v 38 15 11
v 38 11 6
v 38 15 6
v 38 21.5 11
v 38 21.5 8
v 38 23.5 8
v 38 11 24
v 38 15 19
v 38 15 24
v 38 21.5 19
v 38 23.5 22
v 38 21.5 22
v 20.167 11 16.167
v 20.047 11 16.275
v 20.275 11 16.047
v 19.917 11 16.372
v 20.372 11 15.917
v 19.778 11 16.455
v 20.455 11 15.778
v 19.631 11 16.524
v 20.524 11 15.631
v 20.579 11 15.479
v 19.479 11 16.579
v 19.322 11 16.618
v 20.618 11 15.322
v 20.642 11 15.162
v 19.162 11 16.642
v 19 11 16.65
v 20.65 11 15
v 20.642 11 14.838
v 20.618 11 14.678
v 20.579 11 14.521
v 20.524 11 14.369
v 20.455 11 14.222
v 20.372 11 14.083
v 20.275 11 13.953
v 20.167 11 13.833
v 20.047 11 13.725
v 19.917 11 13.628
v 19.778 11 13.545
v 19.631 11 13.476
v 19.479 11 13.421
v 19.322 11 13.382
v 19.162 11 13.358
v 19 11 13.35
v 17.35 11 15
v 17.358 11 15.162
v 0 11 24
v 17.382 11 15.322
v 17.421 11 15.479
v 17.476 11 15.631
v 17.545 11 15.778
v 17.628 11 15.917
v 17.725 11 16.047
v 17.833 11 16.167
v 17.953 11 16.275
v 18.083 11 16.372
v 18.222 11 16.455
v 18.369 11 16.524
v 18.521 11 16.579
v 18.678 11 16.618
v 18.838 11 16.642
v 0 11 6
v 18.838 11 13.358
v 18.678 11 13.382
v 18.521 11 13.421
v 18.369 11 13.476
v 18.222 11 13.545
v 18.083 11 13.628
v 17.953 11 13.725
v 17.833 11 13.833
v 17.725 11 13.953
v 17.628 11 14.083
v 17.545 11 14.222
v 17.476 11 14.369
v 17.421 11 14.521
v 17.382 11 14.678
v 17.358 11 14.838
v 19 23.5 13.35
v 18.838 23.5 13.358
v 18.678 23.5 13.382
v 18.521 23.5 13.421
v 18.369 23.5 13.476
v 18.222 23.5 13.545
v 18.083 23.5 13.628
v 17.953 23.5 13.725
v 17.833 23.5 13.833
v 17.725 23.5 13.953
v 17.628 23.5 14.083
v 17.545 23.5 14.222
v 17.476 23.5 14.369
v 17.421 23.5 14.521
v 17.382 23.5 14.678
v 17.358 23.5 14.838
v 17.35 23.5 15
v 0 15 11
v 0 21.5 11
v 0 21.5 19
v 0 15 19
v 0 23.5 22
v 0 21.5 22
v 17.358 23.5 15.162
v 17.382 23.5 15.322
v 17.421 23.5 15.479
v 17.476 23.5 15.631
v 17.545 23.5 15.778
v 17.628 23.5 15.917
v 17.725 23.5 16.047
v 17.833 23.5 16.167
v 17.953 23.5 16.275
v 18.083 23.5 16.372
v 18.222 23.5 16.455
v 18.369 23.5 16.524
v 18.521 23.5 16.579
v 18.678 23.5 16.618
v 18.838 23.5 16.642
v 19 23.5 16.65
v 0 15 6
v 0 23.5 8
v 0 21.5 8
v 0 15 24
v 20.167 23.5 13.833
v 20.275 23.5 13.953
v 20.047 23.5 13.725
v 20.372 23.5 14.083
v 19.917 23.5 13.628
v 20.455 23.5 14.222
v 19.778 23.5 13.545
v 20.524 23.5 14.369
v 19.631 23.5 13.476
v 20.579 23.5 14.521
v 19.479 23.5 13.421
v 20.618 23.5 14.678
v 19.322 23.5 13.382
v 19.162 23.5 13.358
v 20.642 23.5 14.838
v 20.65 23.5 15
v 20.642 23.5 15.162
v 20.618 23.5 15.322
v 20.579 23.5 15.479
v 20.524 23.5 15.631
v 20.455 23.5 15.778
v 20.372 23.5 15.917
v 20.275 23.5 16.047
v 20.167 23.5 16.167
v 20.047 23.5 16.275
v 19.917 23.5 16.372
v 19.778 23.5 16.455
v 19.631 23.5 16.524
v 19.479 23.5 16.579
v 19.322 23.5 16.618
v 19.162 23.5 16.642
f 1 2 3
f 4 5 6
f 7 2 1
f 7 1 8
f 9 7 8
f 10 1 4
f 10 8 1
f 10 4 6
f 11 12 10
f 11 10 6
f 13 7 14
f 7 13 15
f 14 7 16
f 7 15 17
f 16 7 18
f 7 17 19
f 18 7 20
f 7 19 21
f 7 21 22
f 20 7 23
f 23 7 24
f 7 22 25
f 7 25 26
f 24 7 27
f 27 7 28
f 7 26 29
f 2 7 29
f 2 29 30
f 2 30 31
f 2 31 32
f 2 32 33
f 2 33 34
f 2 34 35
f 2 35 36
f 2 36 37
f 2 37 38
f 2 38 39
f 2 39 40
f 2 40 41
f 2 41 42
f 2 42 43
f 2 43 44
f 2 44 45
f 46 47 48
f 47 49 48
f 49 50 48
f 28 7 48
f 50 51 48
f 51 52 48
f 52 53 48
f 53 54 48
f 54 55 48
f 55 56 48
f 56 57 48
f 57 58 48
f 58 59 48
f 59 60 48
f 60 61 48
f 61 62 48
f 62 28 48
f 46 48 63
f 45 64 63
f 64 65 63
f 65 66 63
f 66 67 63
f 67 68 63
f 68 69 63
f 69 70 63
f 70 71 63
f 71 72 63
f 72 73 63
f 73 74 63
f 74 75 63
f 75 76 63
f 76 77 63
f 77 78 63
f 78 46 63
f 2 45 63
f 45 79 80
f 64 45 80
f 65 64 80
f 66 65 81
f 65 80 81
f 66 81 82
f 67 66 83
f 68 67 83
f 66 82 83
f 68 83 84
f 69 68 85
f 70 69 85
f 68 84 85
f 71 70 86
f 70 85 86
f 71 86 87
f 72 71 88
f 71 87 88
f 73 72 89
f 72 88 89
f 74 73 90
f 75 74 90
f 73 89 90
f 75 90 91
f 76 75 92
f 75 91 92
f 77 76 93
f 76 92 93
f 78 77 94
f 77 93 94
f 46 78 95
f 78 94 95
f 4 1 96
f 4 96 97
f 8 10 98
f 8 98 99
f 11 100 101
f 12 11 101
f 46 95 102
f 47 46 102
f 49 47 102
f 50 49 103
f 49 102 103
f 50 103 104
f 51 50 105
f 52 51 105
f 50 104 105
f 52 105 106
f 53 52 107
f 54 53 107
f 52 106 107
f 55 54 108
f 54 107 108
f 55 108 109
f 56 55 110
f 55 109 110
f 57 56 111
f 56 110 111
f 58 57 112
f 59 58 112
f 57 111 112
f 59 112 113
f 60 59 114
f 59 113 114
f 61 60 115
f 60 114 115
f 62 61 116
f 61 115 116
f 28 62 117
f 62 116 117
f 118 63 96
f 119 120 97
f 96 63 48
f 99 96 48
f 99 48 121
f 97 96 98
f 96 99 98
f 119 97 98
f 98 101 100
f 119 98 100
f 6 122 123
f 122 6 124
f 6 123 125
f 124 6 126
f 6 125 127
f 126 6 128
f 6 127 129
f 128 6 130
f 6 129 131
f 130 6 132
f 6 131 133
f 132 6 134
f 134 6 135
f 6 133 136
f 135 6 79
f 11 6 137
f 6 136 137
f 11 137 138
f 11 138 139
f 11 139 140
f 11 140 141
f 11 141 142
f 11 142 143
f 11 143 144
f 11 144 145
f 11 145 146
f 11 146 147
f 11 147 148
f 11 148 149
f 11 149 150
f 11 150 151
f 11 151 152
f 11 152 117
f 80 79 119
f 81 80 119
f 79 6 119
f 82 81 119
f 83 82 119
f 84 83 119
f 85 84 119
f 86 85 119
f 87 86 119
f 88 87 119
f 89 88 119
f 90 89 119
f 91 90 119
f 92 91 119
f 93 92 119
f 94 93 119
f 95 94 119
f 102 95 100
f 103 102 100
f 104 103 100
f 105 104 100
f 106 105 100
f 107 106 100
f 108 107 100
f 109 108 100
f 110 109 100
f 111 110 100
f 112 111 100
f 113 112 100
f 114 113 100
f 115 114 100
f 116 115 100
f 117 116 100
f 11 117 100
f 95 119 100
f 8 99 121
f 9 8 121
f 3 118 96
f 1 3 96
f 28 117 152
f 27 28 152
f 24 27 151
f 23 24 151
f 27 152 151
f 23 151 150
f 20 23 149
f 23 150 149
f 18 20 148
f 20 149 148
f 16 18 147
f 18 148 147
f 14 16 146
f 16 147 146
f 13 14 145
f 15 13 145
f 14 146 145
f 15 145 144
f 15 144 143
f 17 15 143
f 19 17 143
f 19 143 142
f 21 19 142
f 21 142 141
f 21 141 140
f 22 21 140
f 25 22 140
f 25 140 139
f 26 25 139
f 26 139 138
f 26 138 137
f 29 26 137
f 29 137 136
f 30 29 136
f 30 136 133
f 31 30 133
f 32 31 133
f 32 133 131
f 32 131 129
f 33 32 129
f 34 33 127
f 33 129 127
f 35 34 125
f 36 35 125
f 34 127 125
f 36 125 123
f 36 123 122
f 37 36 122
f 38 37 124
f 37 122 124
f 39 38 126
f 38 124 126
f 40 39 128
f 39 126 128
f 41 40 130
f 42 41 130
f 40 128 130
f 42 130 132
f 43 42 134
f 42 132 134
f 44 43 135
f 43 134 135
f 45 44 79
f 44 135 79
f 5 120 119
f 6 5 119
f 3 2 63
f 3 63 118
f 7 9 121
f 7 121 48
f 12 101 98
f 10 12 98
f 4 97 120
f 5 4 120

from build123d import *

# Parameters (mm, degrees)
F1_DEPTH = 38
F3_DEPTH = 25


with BuildPart() as f1:
    # F0 (on Right) → F1 (new body)
    with BuildSketch(Plane.YZ):
        Polygon((15, 19), (15, 20), (15, 24), (11, 24), (11, 15), (11, 6), (15, 6), (15, 10), (15, 11), (21.5, 11), (21.5, 8), (23.5, 8), (23.5, 15), (23.5, 22), (21.5, 22), (21.5, 19), align=None)
    extrude(amount=F1_DEPTH)

    # F2 (on face) → F3 (cut)
    with BuildSketch(Plane(origin=(0, 23.5, 0), x_dir=(-1, 0, 0), z_dir=(0, 1, 0))):
        with BuildLine():
            ThreePointArc((-17.35, 15), (-17.833274, 16.166726), (-19, 16.65))
            Line((-19, 16.65), (-19, 13.35))
            ThreePointArc((-19, 13.35), (-17.833274, 13.833274), (-17.35, 15))
        make_face()
        with BuildLine():
            Line((-19, 13.35), (-19, 16.65))
            ThreePointArc((-19, 16.65), (-20.65, 15), (-19, 13.35))
        make_face()
    extrude(amount=-F3_DEPTH, mode=Mode.SUBTRACT)


solid = f1.part
